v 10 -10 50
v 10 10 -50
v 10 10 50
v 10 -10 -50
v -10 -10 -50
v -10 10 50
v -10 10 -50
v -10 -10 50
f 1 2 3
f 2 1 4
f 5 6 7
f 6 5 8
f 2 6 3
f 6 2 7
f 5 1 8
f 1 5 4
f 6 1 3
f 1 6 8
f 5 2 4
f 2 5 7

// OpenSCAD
// Parameters
profile_width = 20.0; //[10.0:40.0:0.5]
profile_height = 20.0; //[10.0:40.0:0.5]
length = 100.0; //[50.0:200.0:1]
center = 1; //[0:1:1]
cornerHole = 1; //[0:1:1]
wall_thickness = 2.0; //[1.0:4.0:0.25]
slot_depth = 6.0; //[3.0:10.0:0.25]
slot_neck_width = 6.2; //[4.0:8.0:0.1]
slot_cavity_width = 10.5; //[7.0:14.0:0.1]
slot_cavity_inset = 2.0; //[1.0:4.0:0.25]
center_bore_diameter = 5.0; //[3.0:8.0:0.1]
web_thickness = 2.0; //[1.0:4.0:0.25]
corner_hole_diameter = 3.2; //[2.0:6.0:0.1]
corner_hole_inset = 5.0; //[3.0:8.0:0.25]
overlap = 1.0; //[0.5:2.0:0.25]

// Extrusion - complete detailed geometry
module extrusion() {
  color("Silver") {
    difference() {
      // Main body
      cube([profile_width, profile_height, length], center=true);
      
      // T-slot channels
      union() {
        translate([profile_width/2 - (slot_depth + overlap)/2, 0, 0])
          cube([slot_depth + overlap, slot_neck_width, length + 2*overlap], center=true);
        translate([profile_width/2 - slot_cavity_inset - (slot_depth - slot_cavity_inset + overlap)/2, 0, 0])
          cube([slot_depth - slot_cavity_inset + overlap, slot_cavity_width, length + 2*overlap], center=true);
        translate([-profile_width/2 + (slot_depth + overlap)/2, 0, 0])
          cube([slot_depth + overlap, slot_neck_width, length + 2*overlap], center=true);
        translate([-profile_width/2 + slot_cavity_inset + (slot_depth - slot_cavity_inset + overlap)/2, 0, 0])
          cube([slot_depth - slot_cavity_inset + overlap, slot_cavity_width, length + 2*overlap], center=true);
        translate([0, profile_height/2 - (slot_depth + overlap)/2, 0])
          cube([slot_neck_width, slot_depth + overlap, length + 2*overlap], center=true);
        translate([0, profile_height/2 - slot_cavity_inset - (slot_depth - slot_cavity_inset + overlap)/2, 0])
          cube([slot_cavity_width, slot_depth - slot_cavity_inset + overlap, length + 2*overlap], center=true);
        translate([0, -profile_height/2 + (slot_depth + overlap)/2, 0])
          cube([slot_neck_width, slot_depth + overlap, length + 2*overlap], center=true);
        translate([0, -profile_height/2 + slot_cavity_inset + (slot_depth - slot_cavity_inset + overlap)/2, 0])
          cube([slot_cavity_width, slot_depth - slot_cavity_inset + overlap, length + 2*overlap], center=true);
      }
      
      // Center bore
      translate([0, 0, 0])
        cylinder(r=center_bore_diameter/2, h=length + 2*overlap, center=true);
      
      // Internal webs
      union() {
        translate([0, 0, 0])
          cube([profile_width - 2*wall_thickness, web_thickness, length], center=true);
        translate([0, 0, 0])
          cube([web_thickness, profile_height - 2*wall_thickness, length], center=true);
      }
      
      // Corner holes
      if (cornerHole) {
        union() {
          translate([profile_width/2 - corner_hole_inset, profile_height/2 - corner_hole_inset, 0])
            cylinder(r=corner_hole_diameter/2, h=length + 2*overlap, center=true);
          translate([profile_width/2 - corner_hole_inset, -profile_height/2 + corner_hole_inset, 0])
            cylinder(r=corner_hole_diameter/2, h=length + 2*overlap, center=true);
          translate([-profile_width/2 + corner_hole_inset, profile_height/2 - corner_hole_inset, 0])
            cylinder(r=corner_hole_diameter/2, h=length + 2*overlap, center=true);
          translate([-profile_width/2 + corner_hole_inset, -profile_height/2 + corner_hole_inset, 0])
            cylinder(r=corner_hole_diameter/2, h=length + 2*overlap, center=true);
        }
      }
    }
  }
}

// Extrusion Cross Section - detailed geometry
module extrusion_cross_section() {
  color("DimGray") {
    difference() {
      // Main body
      cube([profile_width, profile_height, length], center=true);
      
      // T-slot channels
      union() {
        translate([profile_width/2 - (slot_depth + overlap)/2, 0, 0])
          cube([slot_depth + overlap, slot_neck_width, length + 2*overlap], center=true);
        translate([profile_width/2 - slot_cavity_inset - (slot_depth - slot_cavity_inset + overlap)/2, 0, 0])
          cube([slot_depth - slot_cavity_inset + overlap, slot_cavity_width, length + 2*overlap], center=true);
        translate([-profile_width/2 + (slot_depth + overlap)/2, 0, 0])
          cube([slot_depth + overlap, slot_neck_width, length + 2*overlap], center=true);
        translate([-profile_width/2 + slot_cavity_inset + (slot_depth - slot_cavity_inset + overlap)/2, 0, 0])
          cube([slot_depth - slot_cavity_inset + overlap, slot_cavity_width, length + 2*overlap], center=true);
        translate([0, profile_height/2 - (slot_depth + overlap)/2, 0])
          cube([slot_neck_width, slot_depth + overlap, length + 2*overlap], center=true);
        translate([0, profile_height/2 - slot_cavity_inset - (slot_depth - slot_cavity_inset + overlap)/2, 0])
          cube([slot_cavity_width, slot_depth - slot_cavity_inset + overlap, length + 2*overlap], center=true);
        translate([0, -profile_height/2 + (slot_depth + overlap)/2, 0])
          cube([slot_neck_width, slot_depth + overlap, length + 2*overlap], center=true);
        translate([0, -profile_height/2 + slot_cavity_inset + (slot_depth - slot_cavity_inset + overlap)/2, 0])
          cube([slot_cavity_width, slot_depth - slot_cavity_inset + overlap, length + 2*overlap], center=true);
      }
      
      // Center bore
      translate([0, 0, 0])
        cylinder(r=center_bore_diameter/2, h=length + 2*overlap, center=true);
      
      // Internal webs
      union() {
        translate([0, 0, 0])
          cube([profile_width - 2*wall_thickness, web_thickness, length], center=true);
        translate([0, 0, 0])
          cube([web_thickness, profile_height - 2*wall_thickness, length], center=true);
      }
      
      // Corner holes
      if (cornerHole) {
        union() {
          translate([profile_width/2 - corner_hole_inset, profile_height/2 - corner_hole_inset, 0])
            cylinder(r=corner_hole_diameter/2, h=length + 2*overlap, center=true);
          translate([profile_width/2 - corner_hole_inset, -profile_height/2 + corner_hole_inset, 0])
            cylinder(r=corner_hole_diameter/2, h=length + 2*overlap, center=true);
          translate([-profile_width/2 + corner_hole_inset, profile_height/2 - corner_hole_inset, 0])
            cylinder(r=corner_hole_diameter/2, h=length + 2*overlap, center=true);
          translate([-profile_width/2 + corner_hole_inset, -profile_height/2 + corner_hole_inset, 0])
            cylinder(r=corner_hole_diameter/2, h=length + 2*overlap, center=true);
        }
      }
    }
  }
}

// Box Corner Profile Section - detailed geometry
module box_corner_profile_section() {
  color("Black") {
    cube([profile_width, profile_height, length], center=true);
  }
}

// Box Corner Profile Sections - detailed geometry
module box_corner_profile_sections() {
  color("Gray") {
    union() {
      box_corner_profile_section();
      translate([0, 0, 0])
        box_corner_profile_section();
    }
  }
}

// Assembly
module assembly() {
  extrusion();
  translate([0, 0, 0])
    extrusion_cross_section();
  translate([0, 0, 0])
    box_corner_profile_section();
  translate([0, 0, 0])
    box_corner_profile_sections();
}

assembly();
